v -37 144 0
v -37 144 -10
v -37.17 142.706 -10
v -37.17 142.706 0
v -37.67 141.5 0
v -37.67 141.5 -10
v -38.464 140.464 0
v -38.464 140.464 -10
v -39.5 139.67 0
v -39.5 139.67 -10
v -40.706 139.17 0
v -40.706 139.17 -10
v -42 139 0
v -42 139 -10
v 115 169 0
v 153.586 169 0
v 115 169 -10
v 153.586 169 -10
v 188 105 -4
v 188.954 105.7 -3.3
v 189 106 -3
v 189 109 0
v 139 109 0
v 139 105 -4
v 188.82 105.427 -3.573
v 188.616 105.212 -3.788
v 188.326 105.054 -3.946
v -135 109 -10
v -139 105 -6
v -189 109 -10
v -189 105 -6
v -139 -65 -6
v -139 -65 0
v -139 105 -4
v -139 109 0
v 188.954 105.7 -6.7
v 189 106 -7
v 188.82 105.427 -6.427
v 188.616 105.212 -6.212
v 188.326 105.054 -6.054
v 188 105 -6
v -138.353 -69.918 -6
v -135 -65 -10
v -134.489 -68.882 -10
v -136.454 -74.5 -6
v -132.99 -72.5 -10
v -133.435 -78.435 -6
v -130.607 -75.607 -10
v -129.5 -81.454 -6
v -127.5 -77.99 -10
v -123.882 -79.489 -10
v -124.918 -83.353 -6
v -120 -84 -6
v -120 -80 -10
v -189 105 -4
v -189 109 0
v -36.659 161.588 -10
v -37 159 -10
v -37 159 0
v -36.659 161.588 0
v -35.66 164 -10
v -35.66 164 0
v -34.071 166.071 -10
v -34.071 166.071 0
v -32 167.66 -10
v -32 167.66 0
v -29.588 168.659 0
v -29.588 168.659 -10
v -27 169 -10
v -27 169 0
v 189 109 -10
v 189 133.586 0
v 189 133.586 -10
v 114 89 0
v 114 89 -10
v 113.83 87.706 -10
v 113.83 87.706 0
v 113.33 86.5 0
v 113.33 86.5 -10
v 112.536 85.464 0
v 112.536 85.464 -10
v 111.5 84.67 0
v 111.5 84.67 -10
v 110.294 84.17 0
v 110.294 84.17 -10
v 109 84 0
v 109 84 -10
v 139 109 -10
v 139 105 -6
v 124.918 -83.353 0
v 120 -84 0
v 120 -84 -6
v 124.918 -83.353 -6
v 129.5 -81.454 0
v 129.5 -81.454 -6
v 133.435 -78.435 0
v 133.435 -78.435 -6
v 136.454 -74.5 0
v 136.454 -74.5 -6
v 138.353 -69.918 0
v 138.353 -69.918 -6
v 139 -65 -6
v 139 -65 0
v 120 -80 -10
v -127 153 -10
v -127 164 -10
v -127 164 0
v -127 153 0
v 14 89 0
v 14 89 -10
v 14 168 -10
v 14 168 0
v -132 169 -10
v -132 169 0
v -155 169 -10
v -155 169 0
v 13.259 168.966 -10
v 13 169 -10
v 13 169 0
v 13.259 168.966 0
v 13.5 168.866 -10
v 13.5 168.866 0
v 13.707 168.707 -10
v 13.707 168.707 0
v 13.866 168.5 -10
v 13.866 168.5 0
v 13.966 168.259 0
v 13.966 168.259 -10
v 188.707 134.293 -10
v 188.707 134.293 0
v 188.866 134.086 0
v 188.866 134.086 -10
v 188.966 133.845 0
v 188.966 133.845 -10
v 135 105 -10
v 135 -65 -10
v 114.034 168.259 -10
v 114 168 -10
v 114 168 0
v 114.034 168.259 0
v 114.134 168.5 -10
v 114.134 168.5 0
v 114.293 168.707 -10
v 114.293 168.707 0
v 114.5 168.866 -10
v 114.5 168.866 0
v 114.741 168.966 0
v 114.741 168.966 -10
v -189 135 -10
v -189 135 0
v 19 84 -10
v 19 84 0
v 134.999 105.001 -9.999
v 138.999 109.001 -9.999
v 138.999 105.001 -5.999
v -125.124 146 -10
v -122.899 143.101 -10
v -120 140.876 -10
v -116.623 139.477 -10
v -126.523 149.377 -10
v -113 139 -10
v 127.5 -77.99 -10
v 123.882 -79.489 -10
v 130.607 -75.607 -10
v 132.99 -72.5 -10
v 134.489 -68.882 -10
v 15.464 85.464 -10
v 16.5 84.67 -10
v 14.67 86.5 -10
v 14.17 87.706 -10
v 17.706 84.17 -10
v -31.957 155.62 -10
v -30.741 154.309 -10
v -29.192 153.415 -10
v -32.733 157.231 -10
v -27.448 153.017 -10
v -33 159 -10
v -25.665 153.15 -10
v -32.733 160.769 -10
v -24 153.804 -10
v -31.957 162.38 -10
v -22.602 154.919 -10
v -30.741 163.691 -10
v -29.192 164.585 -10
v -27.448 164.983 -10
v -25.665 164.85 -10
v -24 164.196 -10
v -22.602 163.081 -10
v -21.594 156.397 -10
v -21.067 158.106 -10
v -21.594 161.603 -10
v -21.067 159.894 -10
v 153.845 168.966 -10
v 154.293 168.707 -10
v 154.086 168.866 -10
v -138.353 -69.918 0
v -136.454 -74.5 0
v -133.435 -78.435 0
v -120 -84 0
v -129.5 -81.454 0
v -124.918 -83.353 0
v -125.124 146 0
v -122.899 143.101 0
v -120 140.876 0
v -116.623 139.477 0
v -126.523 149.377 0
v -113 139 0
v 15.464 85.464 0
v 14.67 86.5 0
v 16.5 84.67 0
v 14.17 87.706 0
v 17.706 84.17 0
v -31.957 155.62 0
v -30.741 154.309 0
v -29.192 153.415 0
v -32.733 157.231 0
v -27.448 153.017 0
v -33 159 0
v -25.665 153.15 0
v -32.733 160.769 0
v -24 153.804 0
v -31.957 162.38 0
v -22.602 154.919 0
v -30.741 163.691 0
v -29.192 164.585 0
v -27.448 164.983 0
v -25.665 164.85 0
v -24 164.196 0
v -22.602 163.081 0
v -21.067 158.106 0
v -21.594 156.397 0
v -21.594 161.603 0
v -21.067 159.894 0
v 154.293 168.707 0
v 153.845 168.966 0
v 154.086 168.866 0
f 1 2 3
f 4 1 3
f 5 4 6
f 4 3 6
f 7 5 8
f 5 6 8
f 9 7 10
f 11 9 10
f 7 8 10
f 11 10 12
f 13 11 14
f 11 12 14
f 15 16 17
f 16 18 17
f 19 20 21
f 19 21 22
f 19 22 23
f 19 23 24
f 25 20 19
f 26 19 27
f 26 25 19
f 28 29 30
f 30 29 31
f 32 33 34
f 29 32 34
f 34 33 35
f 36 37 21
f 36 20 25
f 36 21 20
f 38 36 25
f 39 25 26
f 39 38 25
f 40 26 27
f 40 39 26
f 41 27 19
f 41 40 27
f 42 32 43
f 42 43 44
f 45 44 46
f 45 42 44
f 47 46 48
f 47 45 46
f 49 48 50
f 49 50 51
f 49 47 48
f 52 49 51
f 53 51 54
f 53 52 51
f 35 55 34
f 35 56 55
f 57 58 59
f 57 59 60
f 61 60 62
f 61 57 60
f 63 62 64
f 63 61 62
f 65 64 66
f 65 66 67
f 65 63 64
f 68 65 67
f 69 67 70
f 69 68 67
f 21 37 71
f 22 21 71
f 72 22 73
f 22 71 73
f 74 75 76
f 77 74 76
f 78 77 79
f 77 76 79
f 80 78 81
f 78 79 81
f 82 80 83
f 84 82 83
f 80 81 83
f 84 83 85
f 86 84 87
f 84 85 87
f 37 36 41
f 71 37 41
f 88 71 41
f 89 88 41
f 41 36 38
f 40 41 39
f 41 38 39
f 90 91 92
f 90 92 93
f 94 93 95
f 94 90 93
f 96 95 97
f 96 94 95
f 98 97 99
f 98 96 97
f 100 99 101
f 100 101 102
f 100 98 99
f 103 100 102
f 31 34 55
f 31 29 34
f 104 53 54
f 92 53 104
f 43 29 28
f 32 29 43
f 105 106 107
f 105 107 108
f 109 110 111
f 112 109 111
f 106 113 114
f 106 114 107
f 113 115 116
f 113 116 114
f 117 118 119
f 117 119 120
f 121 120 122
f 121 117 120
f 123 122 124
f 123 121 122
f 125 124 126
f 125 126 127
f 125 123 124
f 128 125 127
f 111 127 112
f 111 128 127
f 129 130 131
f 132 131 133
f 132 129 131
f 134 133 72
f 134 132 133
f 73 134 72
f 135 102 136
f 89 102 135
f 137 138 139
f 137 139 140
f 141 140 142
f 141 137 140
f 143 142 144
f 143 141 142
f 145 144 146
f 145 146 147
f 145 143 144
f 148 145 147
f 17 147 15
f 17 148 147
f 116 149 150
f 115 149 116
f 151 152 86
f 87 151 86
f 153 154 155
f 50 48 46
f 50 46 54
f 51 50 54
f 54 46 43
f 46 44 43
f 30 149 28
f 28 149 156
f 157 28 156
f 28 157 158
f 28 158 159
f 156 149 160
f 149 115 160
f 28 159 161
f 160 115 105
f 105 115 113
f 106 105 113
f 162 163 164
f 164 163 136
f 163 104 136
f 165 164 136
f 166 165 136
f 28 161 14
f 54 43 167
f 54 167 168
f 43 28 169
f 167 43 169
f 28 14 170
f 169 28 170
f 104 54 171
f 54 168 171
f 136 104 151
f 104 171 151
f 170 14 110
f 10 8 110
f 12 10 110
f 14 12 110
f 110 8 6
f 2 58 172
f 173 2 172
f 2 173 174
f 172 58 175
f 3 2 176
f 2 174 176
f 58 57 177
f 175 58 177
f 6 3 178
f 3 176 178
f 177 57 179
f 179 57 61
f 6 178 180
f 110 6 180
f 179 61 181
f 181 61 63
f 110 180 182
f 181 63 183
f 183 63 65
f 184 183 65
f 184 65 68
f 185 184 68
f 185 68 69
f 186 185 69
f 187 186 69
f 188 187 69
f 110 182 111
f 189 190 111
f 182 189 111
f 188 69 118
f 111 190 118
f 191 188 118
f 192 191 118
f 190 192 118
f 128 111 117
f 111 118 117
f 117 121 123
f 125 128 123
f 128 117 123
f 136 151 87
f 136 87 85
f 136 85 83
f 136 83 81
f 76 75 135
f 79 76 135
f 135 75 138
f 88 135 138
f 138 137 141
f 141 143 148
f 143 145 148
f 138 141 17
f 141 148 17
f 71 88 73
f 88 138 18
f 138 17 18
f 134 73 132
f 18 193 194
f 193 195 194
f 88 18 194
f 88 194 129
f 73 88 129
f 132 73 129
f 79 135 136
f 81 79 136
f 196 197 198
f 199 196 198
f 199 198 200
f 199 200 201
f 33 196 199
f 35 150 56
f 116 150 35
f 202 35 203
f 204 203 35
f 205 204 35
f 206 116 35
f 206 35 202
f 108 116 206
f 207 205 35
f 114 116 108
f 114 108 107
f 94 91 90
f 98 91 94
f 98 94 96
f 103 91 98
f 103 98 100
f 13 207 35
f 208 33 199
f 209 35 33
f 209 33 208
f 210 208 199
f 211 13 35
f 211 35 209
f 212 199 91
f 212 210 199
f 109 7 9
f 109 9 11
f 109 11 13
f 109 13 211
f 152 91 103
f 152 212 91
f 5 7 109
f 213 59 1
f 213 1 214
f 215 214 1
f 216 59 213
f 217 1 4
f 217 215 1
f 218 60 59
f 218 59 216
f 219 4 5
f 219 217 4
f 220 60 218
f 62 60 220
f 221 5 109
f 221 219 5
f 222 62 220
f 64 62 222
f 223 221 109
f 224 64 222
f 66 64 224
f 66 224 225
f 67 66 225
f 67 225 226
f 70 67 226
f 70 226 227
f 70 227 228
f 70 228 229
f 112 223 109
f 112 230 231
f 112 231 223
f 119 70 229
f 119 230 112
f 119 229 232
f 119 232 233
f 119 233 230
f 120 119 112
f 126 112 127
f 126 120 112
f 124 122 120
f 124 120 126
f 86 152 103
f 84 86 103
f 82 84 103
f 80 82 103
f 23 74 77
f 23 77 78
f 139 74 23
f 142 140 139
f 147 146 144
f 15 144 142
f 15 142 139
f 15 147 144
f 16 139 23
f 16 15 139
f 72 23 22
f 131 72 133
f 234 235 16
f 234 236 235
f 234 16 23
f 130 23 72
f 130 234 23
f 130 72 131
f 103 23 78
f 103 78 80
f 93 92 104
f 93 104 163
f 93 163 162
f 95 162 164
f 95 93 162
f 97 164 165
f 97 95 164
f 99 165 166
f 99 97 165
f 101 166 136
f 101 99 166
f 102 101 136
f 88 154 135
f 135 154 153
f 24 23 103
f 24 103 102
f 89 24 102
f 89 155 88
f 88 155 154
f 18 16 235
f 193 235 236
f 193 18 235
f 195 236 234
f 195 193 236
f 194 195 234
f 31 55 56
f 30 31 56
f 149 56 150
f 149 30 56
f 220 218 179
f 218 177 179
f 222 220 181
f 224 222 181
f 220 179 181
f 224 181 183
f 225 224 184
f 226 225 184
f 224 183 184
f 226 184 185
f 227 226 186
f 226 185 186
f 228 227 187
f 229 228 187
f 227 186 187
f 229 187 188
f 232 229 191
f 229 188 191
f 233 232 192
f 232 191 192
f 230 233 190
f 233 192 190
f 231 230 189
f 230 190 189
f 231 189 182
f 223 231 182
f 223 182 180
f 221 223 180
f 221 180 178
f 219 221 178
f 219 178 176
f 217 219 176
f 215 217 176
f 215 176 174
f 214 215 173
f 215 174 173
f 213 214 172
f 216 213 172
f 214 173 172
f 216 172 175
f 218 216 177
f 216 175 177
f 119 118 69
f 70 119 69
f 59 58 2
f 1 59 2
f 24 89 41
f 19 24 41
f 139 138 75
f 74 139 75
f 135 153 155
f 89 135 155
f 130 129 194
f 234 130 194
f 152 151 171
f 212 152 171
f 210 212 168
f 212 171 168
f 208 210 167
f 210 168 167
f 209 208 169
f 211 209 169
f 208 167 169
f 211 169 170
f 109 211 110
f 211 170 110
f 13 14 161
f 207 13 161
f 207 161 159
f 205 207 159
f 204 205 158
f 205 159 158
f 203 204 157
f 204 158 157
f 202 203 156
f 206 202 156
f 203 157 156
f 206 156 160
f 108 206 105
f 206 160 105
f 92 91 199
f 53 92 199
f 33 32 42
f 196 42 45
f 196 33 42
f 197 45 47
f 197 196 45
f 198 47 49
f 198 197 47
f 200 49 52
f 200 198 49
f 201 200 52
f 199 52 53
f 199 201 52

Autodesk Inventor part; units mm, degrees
ref_plane "YZ Plane" through (0, 0, 0) normal (1, 0, 0) x (0, 1, 0)
ref_plane "XZ Plane" through (0, 0, 0) normal (0, 1, 0) x (-1, 0, 0)
ref_plane "XY Plane" through (0, 0, 0) normal (0, 0, 1) x (1, 0, 0)
sketch "Sketch1" plane through (0, 0, 0) normal (0, 0, 1) x (1, 0, 0)
  line L0 (0, 118.387006) -> (0, -122.322035)
  line L1 (-200.109041, 0) -> (200.109041, 0)
  line L2 (-139, 84) -> (139, 84)
  line L3 (139, 84) -> (139, -65)
  line L4 (120, -84) -> (-120, -84)
  line L5 (-139, -65) -> (-139, 84)
  arc A0 (-139, -65) -> (-120, -84) centre (-120, -65) ccw
  arc A1 (120, -84) -> (139, -65) centre (120, -65) ccw
  point P0 (0, 0)
  dimension "d0" = 278
  dimension "d1" = 168
  dimension "d2" = 19
extrude "Extrusion1" add sketch "Sketch1" against normal blind 10
sketch "Sketch2" plane through (0, 0, -10) normal (0, 0, -1) x (-1, 0, 0)
  line L0 (139, -65) -> (139, 84)
  line L1 (139, 84) -> (-139, 84)
  line L2 (-139, 84) -> (-139, -65)
  arc A0 (-139, -65) -> (-120, -84) centre (-120, -65) ccw
  line L3 (-120, -84) -> (120, -84)
  arc A1 (120, -84) -> (139, -65) centre (120, -65) ccw
  line L4 (-139, 84) -> (-139, 105)
  line L5 (-139, 105) -> (-188, 105)
  line L6 (-189, 106) -> (-189, 133.585786)
  line L7 (-188.707107, 134.292893) -> (-154.292893, 168.707107)
  line L8 (-153.585786, 169) -> (-115, 169)
  line L9 (-114, 168) -> (-114, 89)
  line L10 (-14, 89) -> (-14, 168)
  line L11 (-13, 169) -> (27, 169)
  line L12 (37, 159) -> (37, 144)
  line L13 (42, 139) -> (113, 139)
  line L14 (139, 84) -> (139, 104)
  line L15 (189, 104) -> (189, 135)
  line L16 (189, 135) -> (155, 169)
  line L17 (155, 169) -> (132, 169)
  arc A2 (-114, 89) -> (-109, 84) centre (-109, 89) ccw
  arc A3 (-19, 84) -> (-14, 89) centre (-19, 89) ccw
  arc A4 (-188.707107, 134.292893) -> (-189, 133.585786) centre (-188, 133.585786) ccw
  arc A5 (-189, 106) -> (-188, 105) centre (-188, 106) ccw
  arc A6 (-153.585786, 169) -> (-154.292893, 168.707107) centre (-153.585786, 168) ccw
  arc A7 (-114, 168) -> (-115, 169) centre (-115, 168) ccw
  arc A8 (-13, 169) -> (-14, 168) centre (-13, 168) ccw
  arc A9 (113, 139) -> (127, 153) centre (113, 153) ccw
  arc A10 (37, 144) -> (42, 139) centre (42, 144) ccw
  line L18 (127, 164) -> (127, 153)
  line L19 (139, 104) -> (189, 104)
  circle A11 centre (27, 159) radius 6
  arc A12 (37, 159) -> (27, 169) centre (27, 159) ccw
  line L20 (132, 169) -> (127, 164)
  line L21 (-139, 84) -> (-135, 84)
  line L22 (-139, 84) -> (-109, 84)
  line L23 (-139, 84) -> (139, 84)
  line L24 (-19, 84) -> (139, 84)
  point P0 (0, 0)
  point P1 (-189, 105)
  point P2 (-154, 169)
  point P3 (-14, 169)
  point P4 (37, 139)
  point P5 (127, 139)
  point P6 (127, 169)
  point P7 (135, 84)
  dimension "d8" = 21
  dimension "d9" = 50
  dimension "d10" = 85
  dimension "d11" = 75
  dimension "d12" = 135
  dimension "d13" = 40
  dimension "d14" = 100
  dimension "d16" = 90
  dimension "d17" = 50
  dimension "d19" = 34
  dimension "d20" = 135
  dimension "d21" = 5
  dimension "d22" = 1
  dimension "d23" = 14
  dimension "d24" = 5
  dimension "d26" = 90
  dimension "d29" = 12
  dimension "d30" = 226
  dimension "d31" = 5
  dimension "d32" = 5
  dimension "d33" = 55
  dimension "d34" = 20
  dimension "d35" = 16
  dimension "d36" = 75
  dimension "d37" = 112
  dimension "d38" = 26
extrude "Extrusion2" add sketch "Sketch2" against normal blind 10 contours L1 A3 L10 A8 L11 A12 L12 A10 L13 A9 L18 L20 L17 L16 L15 L19 L14 | L1 L4 L5 A5 L6 A4 L7 A6 L8 A7 L9 A2
chamfer "Chamfer2" distance 4 angle 45 6 edges at (139, 20, -10) (133.435, -78.435, -10) (0, -84, -10) (-133.435, -78.435, -10) (-139, 19.5, -10) (-164, 104, -10)
chamfer "Chamfer3" distance 4 angle 45 1 edges at (-164, 104, 0)
sketch "Sketch3" plane through (189, 106, -10) normal (1, 0, 0) x (0, 0, -1)
  line L0 (0, 27.585786) -> (0, 0)
  line L1 (0, 27.585786) -> (-10, 27.585786)
  line L2 (-10, 0) -> (-10, 27.585786)
  line L3 (0, 0) -> (-10, 0)
  line L4 (0, 0) -> (0, -1)
  line L5 (0, 0) -> (-10, 0)
  line L6 (-10, -1) -> (-10, 0)
  line L7 (0, -1) -> (-10, -1)
  line L8 (-10, 3) -> (-6, -1)
  line L9 (-10, 3) -> (-10, -1)
  line L10 (0, -1) -> (-10, -1)
  line L11 (-10, -1) -> (-6, -1)
  line L12 (-5, -1) -> (-5, 5.993177)
  line L13 (0, -1) -> (0, 0)
  line L14 (0, 3) -> (-4, -1)
  line L15 (0, 3) -> (0, -1)
  line L16 (0, -1) -> (-4, -1)
  point P0 (-10, -106)
  point P1 (-10, 3)
  point P2 (0, 3)
  dimension "d47" = 45
  dimension "d48" = 4
extrude "Extrusion3" cut sketch "Sketch3" against normal up to surface (50 mm away) contours L0 L3 L14 | L4 L7 L14 L3 | L8 L3 L2 | L3 L8 L7 L6
ref_plane "Work Plane1" through (139, 109, -10) normal (-0.5773503, 0.5773503, 0.5773503) x (-0.7071068, -0.7071068, 0)
sketch "Sketch4" plane through (139, 109, -10) normal (-0.5773503, 0.5773503, 0.5773503) x (-0.7071068, -0.7071068, 0)
  line L0 (2.828427, 4.898979) -> (-31.819805, 24.903146)
  line L1 (5.656854, 0) -> (2.828427, 4.898979)
  line L2 (-35.355339, 20.412415) -> (0, 0)
  line L3 (2.828427, 4.898979) -> (0, 0)
  line L4 (0, 0) -> (5.656854, 0)
  line L5 (5.656854, 0) -> (2.828427, 4.898979)
  point P0 (175.362482, -4.082483)
extrude "Extrusion4" cut sketch "Sketch4" against normal blind 10
move faces "Move1" translate (0, 1, 0) faces at (-172.333333, 104, -4.666667) (-155.666667, 105.333333, -2.666667) (-154.333333, 106.666667, -8.666667)
equation "\"d32\" = d31"
properties part number "SlipersLåda 211018003"
